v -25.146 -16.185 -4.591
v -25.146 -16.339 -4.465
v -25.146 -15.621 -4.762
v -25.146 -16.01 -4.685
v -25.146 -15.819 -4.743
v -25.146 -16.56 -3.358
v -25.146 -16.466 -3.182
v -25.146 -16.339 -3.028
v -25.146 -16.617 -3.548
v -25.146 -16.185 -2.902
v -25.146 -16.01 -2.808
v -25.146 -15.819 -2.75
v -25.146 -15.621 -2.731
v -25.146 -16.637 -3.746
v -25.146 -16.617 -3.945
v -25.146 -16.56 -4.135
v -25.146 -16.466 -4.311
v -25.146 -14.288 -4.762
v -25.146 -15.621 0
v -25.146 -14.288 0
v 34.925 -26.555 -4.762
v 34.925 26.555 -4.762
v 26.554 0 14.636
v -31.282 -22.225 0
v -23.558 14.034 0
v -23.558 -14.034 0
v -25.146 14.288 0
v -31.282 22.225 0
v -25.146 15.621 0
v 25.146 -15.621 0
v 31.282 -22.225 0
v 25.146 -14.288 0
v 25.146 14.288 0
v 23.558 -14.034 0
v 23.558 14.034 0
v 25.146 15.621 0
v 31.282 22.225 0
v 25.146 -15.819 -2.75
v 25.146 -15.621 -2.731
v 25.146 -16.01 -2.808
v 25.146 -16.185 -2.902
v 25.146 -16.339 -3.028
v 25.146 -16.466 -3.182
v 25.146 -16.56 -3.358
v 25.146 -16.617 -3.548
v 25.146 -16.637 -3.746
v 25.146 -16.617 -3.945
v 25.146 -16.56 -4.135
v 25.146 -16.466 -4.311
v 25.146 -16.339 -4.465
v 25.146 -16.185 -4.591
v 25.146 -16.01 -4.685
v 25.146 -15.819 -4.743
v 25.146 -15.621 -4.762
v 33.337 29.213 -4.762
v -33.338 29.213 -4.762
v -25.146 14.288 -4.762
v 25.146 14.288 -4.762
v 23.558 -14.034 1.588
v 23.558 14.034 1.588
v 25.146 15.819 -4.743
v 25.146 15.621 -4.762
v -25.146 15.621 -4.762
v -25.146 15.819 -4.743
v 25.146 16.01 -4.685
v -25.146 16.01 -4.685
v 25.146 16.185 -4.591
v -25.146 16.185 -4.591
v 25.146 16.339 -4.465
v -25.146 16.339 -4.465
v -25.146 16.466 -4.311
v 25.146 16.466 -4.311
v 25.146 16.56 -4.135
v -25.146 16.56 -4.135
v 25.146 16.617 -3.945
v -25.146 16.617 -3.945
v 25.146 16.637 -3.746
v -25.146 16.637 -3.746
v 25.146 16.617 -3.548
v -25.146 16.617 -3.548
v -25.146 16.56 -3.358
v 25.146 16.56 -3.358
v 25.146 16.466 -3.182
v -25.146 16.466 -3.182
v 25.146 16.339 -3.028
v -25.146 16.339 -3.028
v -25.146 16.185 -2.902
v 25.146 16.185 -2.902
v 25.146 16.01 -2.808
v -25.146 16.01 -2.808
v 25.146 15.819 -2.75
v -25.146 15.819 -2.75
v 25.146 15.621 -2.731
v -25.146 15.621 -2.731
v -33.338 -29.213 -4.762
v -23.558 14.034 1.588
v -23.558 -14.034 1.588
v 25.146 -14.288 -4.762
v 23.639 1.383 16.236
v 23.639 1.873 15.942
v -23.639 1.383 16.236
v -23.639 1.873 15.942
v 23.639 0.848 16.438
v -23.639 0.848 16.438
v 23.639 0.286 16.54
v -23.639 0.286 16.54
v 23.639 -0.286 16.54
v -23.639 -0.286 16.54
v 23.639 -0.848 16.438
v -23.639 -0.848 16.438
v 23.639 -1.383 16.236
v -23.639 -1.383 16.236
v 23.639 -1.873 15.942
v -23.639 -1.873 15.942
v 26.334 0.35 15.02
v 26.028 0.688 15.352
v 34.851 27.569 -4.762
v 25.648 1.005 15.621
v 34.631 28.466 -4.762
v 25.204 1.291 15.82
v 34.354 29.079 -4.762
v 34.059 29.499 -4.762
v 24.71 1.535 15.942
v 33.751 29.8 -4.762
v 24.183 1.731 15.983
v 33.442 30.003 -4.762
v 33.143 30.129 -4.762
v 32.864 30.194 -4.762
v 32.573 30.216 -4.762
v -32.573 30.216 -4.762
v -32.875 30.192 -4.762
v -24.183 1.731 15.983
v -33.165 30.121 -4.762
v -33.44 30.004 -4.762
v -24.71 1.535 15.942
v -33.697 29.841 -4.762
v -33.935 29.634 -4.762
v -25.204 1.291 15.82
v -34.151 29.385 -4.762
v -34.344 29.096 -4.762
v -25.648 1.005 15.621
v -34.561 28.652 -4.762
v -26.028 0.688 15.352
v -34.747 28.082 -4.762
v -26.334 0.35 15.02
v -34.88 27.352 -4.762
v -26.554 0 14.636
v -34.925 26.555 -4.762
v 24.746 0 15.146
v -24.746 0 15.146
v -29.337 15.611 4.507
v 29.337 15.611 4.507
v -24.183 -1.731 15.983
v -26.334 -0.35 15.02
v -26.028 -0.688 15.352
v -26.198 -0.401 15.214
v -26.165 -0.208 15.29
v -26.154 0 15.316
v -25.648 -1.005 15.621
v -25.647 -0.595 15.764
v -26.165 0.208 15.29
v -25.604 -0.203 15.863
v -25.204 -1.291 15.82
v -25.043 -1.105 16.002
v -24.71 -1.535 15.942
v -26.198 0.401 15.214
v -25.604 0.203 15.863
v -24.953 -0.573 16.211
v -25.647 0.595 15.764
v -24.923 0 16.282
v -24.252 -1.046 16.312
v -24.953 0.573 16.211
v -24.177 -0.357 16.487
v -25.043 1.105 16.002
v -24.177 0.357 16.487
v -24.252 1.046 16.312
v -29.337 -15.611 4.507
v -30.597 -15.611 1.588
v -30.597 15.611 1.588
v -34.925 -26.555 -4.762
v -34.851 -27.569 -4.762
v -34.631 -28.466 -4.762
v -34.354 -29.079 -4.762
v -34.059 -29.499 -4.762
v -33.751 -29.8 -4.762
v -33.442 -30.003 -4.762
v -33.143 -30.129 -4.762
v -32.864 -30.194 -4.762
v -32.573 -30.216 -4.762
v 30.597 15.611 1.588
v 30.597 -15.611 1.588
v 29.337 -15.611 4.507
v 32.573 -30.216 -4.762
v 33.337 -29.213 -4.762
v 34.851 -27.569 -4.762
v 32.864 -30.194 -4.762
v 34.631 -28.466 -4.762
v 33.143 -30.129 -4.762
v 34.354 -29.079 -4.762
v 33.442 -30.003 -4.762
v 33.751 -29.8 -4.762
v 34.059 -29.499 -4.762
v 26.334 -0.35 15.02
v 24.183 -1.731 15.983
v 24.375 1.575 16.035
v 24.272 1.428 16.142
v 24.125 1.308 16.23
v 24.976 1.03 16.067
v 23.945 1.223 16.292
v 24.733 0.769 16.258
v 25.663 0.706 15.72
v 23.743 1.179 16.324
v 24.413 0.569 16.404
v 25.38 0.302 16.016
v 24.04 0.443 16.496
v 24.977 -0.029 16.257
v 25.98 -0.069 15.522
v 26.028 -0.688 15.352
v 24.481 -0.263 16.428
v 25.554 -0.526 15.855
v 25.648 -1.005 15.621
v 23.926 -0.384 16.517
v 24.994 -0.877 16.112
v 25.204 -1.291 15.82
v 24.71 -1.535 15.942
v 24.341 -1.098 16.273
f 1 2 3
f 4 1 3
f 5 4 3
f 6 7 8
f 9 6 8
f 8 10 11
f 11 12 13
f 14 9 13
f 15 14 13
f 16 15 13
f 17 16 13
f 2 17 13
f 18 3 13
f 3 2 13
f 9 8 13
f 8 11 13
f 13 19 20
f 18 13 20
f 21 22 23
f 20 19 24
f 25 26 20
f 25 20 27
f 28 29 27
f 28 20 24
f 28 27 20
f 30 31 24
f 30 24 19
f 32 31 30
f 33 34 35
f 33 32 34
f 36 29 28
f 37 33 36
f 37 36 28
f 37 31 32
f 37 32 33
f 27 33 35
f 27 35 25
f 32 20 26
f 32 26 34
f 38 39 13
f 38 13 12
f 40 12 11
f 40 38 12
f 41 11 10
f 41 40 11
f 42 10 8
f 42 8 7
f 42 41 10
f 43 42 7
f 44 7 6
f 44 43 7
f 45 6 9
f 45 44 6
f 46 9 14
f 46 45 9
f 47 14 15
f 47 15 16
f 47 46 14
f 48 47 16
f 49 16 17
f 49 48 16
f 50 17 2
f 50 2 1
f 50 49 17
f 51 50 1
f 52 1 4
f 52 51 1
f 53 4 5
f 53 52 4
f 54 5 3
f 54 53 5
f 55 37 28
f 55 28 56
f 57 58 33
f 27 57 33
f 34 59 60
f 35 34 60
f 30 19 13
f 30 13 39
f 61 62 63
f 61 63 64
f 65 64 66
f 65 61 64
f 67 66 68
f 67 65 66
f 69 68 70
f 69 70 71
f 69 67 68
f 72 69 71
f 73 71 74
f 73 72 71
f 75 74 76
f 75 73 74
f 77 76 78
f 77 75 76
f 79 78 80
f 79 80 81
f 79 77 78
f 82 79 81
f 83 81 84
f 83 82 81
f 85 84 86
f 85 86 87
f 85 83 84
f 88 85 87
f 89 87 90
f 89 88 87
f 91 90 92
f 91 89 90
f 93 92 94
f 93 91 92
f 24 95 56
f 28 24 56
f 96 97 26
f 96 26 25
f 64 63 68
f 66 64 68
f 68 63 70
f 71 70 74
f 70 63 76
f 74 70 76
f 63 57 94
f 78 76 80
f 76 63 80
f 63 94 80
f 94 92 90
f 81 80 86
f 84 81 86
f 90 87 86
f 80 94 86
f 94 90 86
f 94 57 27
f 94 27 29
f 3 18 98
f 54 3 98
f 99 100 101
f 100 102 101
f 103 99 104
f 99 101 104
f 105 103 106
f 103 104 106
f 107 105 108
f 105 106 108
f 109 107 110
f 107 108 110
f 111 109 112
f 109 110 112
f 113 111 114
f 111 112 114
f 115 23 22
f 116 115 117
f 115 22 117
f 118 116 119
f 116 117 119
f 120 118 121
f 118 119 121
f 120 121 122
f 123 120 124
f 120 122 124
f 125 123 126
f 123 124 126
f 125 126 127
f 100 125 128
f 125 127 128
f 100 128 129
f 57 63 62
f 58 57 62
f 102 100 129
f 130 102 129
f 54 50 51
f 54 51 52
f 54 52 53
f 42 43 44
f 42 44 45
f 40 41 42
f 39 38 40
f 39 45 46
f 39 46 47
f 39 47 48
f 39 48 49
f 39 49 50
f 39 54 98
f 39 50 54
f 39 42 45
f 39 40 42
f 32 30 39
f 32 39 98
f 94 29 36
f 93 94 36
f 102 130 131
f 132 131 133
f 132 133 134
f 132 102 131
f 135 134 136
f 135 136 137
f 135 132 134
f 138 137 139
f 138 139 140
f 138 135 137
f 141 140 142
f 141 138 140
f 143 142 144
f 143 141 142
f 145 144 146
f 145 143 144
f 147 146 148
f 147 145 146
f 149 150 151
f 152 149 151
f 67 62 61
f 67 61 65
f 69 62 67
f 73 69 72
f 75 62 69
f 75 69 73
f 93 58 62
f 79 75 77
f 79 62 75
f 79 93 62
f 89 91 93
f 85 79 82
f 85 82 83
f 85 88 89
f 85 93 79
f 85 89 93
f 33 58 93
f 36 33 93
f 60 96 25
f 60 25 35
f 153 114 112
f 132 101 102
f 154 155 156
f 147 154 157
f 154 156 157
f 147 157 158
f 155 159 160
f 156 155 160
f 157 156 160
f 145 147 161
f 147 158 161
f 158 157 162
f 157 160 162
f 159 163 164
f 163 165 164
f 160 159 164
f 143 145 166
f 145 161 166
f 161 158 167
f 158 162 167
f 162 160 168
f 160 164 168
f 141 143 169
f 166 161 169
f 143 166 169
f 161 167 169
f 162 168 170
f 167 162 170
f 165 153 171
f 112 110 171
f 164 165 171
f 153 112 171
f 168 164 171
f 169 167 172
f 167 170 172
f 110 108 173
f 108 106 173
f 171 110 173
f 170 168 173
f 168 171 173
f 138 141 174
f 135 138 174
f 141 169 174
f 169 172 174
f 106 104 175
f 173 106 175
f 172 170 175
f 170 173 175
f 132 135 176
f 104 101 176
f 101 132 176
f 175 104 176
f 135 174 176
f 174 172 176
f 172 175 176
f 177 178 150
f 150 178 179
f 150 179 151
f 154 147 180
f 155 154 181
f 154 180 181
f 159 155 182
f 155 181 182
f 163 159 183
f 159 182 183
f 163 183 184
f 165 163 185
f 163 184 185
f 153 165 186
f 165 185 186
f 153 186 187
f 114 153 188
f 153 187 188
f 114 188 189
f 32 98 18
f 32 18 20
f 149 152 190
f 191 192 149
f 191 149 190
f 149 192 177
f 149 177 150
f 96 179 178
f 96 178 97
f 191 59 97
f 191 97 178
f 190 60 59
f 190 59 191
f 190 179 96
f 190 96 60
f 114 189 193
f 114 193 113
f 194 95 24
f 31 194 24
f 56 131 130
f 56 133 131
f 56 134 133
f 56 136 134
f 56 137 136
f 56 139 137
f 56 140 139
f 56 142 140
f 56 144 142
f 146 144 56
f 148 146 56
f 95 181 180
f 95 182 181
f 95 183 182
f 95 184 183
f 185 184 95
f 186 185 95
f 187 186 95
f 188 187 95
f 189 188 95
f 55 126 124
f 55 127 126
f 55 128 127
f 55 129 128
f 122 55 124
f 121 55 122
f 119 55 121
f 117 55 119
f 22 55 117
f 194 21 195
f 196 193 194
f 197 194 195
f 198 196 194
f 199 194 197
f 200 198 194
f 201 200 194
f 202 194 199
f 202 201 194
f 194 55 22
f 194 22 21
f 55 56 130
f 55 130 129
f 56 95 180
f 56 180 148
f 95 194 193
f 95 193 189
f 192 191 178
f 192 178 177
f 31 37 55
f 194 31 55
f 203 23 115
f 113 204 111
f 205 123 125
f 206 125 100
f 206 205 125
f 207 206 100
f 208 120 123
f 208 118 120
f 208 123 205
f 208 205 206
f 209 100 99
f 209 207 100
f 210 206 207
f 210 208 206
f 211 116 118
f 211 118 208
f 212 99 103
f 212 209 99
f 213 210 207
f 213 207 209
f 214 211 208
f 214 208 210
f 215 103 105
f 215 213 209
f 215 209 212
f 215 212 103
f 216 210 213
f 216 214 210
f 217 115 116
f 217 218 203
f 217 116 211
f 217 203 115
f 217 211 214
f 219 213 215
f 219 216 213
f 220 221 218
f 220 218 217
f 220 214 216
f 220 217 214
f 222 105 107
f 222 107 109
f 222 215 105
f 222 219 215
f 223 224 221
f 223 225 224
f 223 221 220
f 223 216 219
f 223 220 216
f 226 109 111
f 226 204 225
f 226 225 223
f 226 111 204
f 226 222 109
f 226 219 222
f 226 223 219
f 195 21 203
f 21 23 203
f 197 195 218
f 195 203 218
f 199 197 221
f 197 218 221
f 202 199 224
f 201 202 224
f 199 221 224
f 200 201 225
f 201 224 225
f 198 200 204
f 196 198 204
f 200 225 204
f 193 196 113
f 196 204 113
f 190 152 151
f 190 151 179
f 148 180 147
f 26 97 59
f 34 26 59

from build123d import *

# Parameters (mm, degrees)
F0_W      = 63.5
F0_H      = 44.45
F0_W_2    = 50.292
F0_H_2    = 31.242
F1_DEPTH  = 1.5875
F2_W      = 50.292
F2_H      = 31.242
F2_W_2    = 47.117
F2_H_2    = 28.067
F3_DEPTH  = 6.35
F5_DEPTH  = 34.925
F7_DEPTH  = 38.1
F9_DEPTH  = 38.1
F11_DEPTH = 38.1
F12_R     = 3.175
F14_DEPTH = 50.292
F15_W     = 28.575
F15_H     = 4.7625
F16_DEPTH = 50.292


with BuildPart() as f1:
    # F0 (on Top) → F1 (new body)
    with BuildSketch(Plane.XY):
        Rectangle(F0_W, F0_H)
        Rectangle(F0_W_2, F0_H_2, mode=Mode.SUBTRACT)
    extrude(amount=F1_DEPTH)

    # F2 (on face) → F3 (join)
    with BuildSketch(Plane.XY.offset(1.5875)):
        Rectangle(F2_W, F2_H)
        Rectangle(F2_W_2, F2_H_2, mode=Mode.SUBTRACT)
    extrude(amount=-F3_DEPTH)

    # F4 (on Right) → F5 (join, symmetric)
    with BuildSketch(Plane.YZ):
        Polygon((-15.6114658074, 4.507067833), (0, 15.1461502537), (15.6114658074, 4.507067833), (15.6114658074, 0), (22.225, 0), (29.2133475819, -4.7625), (32.3883475819, -4.7625), (0, 17.3098860042), (-32.3883475819, -4.7625), (-29.2133475819, -4.7625), (-22.225, 0), (-15.6114658074, 0), align=None)
    extrude(amount=F5_DEPTH, both=True)

    # F6 (on Front) → F7 (cut, symmetric)
    with BuildSketch(Plane.XZ):
        Polygon((-34.925, -4.7625), (-25.4, 17.3098860042), (-34.925, 17.3098860042), align=None)
        Polygon((34.925, -4.7625), (34.925, 17.3098860042), (25.4, 17.3098860042), align=None)
    extrude(amount=F7_DEPTH, both=True, mode=Mode.SUBTRACT)

    # F8 (on Front) → F9 (join, symmetric)
    with BuildSketch(Plane.XZ):
        Polygon((-23.8125, 17.3098860042), (-25.4, 17.3098860042), (-34.925, -4.7625), (-33.3375, -4.7625), align=None)
        Polygon((34.925, -4.7625), (25.4, 17.3098860042), (23.8125, 17.3098860042), (33.3375, -4.7625), align=None)
    extrude(amount=F9_DEPTH, both=True)

    # F10 (on Right) → F11 (cut, symmetric)
    with BuildSketch(Plane.YZ):
        Polygon((-30.21584, -4.7625), (0, 17.3098860042), (-38.1, 17.3098860042), (-38.1, -4.7625), align=None)
        Polygon((38.1, 17.3098860042), (0, 17.3098860042), (30.21584, -4.7625), (38.1, -4.7625), align=None)
    extrude(amount=F11_DEPTH, both=True, mode=Mode.SUBTRACT)

    # F12
    f12_edges = [f1.edges().sort_by_distance(p)[0] for p in [
        (30.1625, -15.10792, 6.273693),
        (30.1625, 15.10792, 6.273693),
        (0, 0, 17.309886),
        (-30.1625, -15.10792, 6.273693),
        (-30.1625, 15.10792, 6.273693),
    ]]
    fillet(f12_edges, radius=F12_R)

    # F13 (on face) → F14 (join, through all)
    with BuildSketch(Plane.YZ.offset(25.146)):
        with BuildLine():
            Line((-15.621, -4.7625), (-15.621, -2.7305))
            ThreePointArc((-15.621, -2.7305), (-16.637, -3.7465), (-15.621, -4.7625))
        make_face()
        with BuildLine():
            ThreePointArc((15.621, -4.7625), (16.637, -3.7465), (15.621, -2.7305))
            Line((15.621, -2.7305), (15.621, -4.7625))
        make_face()
    extrude(amount=-F14_DEPTH)

    # F15 (on face) → F16 (cut, through all)
    with BuildSketch(Plane.YZ.offset(25.146)):
        with Locations((0, -2.38125)):
            Rectangle(F15_W, F15_H)
    extrude(amount=-F16_DEPTH, mode=Mode.SUBTRACT)


solid = f1.part
